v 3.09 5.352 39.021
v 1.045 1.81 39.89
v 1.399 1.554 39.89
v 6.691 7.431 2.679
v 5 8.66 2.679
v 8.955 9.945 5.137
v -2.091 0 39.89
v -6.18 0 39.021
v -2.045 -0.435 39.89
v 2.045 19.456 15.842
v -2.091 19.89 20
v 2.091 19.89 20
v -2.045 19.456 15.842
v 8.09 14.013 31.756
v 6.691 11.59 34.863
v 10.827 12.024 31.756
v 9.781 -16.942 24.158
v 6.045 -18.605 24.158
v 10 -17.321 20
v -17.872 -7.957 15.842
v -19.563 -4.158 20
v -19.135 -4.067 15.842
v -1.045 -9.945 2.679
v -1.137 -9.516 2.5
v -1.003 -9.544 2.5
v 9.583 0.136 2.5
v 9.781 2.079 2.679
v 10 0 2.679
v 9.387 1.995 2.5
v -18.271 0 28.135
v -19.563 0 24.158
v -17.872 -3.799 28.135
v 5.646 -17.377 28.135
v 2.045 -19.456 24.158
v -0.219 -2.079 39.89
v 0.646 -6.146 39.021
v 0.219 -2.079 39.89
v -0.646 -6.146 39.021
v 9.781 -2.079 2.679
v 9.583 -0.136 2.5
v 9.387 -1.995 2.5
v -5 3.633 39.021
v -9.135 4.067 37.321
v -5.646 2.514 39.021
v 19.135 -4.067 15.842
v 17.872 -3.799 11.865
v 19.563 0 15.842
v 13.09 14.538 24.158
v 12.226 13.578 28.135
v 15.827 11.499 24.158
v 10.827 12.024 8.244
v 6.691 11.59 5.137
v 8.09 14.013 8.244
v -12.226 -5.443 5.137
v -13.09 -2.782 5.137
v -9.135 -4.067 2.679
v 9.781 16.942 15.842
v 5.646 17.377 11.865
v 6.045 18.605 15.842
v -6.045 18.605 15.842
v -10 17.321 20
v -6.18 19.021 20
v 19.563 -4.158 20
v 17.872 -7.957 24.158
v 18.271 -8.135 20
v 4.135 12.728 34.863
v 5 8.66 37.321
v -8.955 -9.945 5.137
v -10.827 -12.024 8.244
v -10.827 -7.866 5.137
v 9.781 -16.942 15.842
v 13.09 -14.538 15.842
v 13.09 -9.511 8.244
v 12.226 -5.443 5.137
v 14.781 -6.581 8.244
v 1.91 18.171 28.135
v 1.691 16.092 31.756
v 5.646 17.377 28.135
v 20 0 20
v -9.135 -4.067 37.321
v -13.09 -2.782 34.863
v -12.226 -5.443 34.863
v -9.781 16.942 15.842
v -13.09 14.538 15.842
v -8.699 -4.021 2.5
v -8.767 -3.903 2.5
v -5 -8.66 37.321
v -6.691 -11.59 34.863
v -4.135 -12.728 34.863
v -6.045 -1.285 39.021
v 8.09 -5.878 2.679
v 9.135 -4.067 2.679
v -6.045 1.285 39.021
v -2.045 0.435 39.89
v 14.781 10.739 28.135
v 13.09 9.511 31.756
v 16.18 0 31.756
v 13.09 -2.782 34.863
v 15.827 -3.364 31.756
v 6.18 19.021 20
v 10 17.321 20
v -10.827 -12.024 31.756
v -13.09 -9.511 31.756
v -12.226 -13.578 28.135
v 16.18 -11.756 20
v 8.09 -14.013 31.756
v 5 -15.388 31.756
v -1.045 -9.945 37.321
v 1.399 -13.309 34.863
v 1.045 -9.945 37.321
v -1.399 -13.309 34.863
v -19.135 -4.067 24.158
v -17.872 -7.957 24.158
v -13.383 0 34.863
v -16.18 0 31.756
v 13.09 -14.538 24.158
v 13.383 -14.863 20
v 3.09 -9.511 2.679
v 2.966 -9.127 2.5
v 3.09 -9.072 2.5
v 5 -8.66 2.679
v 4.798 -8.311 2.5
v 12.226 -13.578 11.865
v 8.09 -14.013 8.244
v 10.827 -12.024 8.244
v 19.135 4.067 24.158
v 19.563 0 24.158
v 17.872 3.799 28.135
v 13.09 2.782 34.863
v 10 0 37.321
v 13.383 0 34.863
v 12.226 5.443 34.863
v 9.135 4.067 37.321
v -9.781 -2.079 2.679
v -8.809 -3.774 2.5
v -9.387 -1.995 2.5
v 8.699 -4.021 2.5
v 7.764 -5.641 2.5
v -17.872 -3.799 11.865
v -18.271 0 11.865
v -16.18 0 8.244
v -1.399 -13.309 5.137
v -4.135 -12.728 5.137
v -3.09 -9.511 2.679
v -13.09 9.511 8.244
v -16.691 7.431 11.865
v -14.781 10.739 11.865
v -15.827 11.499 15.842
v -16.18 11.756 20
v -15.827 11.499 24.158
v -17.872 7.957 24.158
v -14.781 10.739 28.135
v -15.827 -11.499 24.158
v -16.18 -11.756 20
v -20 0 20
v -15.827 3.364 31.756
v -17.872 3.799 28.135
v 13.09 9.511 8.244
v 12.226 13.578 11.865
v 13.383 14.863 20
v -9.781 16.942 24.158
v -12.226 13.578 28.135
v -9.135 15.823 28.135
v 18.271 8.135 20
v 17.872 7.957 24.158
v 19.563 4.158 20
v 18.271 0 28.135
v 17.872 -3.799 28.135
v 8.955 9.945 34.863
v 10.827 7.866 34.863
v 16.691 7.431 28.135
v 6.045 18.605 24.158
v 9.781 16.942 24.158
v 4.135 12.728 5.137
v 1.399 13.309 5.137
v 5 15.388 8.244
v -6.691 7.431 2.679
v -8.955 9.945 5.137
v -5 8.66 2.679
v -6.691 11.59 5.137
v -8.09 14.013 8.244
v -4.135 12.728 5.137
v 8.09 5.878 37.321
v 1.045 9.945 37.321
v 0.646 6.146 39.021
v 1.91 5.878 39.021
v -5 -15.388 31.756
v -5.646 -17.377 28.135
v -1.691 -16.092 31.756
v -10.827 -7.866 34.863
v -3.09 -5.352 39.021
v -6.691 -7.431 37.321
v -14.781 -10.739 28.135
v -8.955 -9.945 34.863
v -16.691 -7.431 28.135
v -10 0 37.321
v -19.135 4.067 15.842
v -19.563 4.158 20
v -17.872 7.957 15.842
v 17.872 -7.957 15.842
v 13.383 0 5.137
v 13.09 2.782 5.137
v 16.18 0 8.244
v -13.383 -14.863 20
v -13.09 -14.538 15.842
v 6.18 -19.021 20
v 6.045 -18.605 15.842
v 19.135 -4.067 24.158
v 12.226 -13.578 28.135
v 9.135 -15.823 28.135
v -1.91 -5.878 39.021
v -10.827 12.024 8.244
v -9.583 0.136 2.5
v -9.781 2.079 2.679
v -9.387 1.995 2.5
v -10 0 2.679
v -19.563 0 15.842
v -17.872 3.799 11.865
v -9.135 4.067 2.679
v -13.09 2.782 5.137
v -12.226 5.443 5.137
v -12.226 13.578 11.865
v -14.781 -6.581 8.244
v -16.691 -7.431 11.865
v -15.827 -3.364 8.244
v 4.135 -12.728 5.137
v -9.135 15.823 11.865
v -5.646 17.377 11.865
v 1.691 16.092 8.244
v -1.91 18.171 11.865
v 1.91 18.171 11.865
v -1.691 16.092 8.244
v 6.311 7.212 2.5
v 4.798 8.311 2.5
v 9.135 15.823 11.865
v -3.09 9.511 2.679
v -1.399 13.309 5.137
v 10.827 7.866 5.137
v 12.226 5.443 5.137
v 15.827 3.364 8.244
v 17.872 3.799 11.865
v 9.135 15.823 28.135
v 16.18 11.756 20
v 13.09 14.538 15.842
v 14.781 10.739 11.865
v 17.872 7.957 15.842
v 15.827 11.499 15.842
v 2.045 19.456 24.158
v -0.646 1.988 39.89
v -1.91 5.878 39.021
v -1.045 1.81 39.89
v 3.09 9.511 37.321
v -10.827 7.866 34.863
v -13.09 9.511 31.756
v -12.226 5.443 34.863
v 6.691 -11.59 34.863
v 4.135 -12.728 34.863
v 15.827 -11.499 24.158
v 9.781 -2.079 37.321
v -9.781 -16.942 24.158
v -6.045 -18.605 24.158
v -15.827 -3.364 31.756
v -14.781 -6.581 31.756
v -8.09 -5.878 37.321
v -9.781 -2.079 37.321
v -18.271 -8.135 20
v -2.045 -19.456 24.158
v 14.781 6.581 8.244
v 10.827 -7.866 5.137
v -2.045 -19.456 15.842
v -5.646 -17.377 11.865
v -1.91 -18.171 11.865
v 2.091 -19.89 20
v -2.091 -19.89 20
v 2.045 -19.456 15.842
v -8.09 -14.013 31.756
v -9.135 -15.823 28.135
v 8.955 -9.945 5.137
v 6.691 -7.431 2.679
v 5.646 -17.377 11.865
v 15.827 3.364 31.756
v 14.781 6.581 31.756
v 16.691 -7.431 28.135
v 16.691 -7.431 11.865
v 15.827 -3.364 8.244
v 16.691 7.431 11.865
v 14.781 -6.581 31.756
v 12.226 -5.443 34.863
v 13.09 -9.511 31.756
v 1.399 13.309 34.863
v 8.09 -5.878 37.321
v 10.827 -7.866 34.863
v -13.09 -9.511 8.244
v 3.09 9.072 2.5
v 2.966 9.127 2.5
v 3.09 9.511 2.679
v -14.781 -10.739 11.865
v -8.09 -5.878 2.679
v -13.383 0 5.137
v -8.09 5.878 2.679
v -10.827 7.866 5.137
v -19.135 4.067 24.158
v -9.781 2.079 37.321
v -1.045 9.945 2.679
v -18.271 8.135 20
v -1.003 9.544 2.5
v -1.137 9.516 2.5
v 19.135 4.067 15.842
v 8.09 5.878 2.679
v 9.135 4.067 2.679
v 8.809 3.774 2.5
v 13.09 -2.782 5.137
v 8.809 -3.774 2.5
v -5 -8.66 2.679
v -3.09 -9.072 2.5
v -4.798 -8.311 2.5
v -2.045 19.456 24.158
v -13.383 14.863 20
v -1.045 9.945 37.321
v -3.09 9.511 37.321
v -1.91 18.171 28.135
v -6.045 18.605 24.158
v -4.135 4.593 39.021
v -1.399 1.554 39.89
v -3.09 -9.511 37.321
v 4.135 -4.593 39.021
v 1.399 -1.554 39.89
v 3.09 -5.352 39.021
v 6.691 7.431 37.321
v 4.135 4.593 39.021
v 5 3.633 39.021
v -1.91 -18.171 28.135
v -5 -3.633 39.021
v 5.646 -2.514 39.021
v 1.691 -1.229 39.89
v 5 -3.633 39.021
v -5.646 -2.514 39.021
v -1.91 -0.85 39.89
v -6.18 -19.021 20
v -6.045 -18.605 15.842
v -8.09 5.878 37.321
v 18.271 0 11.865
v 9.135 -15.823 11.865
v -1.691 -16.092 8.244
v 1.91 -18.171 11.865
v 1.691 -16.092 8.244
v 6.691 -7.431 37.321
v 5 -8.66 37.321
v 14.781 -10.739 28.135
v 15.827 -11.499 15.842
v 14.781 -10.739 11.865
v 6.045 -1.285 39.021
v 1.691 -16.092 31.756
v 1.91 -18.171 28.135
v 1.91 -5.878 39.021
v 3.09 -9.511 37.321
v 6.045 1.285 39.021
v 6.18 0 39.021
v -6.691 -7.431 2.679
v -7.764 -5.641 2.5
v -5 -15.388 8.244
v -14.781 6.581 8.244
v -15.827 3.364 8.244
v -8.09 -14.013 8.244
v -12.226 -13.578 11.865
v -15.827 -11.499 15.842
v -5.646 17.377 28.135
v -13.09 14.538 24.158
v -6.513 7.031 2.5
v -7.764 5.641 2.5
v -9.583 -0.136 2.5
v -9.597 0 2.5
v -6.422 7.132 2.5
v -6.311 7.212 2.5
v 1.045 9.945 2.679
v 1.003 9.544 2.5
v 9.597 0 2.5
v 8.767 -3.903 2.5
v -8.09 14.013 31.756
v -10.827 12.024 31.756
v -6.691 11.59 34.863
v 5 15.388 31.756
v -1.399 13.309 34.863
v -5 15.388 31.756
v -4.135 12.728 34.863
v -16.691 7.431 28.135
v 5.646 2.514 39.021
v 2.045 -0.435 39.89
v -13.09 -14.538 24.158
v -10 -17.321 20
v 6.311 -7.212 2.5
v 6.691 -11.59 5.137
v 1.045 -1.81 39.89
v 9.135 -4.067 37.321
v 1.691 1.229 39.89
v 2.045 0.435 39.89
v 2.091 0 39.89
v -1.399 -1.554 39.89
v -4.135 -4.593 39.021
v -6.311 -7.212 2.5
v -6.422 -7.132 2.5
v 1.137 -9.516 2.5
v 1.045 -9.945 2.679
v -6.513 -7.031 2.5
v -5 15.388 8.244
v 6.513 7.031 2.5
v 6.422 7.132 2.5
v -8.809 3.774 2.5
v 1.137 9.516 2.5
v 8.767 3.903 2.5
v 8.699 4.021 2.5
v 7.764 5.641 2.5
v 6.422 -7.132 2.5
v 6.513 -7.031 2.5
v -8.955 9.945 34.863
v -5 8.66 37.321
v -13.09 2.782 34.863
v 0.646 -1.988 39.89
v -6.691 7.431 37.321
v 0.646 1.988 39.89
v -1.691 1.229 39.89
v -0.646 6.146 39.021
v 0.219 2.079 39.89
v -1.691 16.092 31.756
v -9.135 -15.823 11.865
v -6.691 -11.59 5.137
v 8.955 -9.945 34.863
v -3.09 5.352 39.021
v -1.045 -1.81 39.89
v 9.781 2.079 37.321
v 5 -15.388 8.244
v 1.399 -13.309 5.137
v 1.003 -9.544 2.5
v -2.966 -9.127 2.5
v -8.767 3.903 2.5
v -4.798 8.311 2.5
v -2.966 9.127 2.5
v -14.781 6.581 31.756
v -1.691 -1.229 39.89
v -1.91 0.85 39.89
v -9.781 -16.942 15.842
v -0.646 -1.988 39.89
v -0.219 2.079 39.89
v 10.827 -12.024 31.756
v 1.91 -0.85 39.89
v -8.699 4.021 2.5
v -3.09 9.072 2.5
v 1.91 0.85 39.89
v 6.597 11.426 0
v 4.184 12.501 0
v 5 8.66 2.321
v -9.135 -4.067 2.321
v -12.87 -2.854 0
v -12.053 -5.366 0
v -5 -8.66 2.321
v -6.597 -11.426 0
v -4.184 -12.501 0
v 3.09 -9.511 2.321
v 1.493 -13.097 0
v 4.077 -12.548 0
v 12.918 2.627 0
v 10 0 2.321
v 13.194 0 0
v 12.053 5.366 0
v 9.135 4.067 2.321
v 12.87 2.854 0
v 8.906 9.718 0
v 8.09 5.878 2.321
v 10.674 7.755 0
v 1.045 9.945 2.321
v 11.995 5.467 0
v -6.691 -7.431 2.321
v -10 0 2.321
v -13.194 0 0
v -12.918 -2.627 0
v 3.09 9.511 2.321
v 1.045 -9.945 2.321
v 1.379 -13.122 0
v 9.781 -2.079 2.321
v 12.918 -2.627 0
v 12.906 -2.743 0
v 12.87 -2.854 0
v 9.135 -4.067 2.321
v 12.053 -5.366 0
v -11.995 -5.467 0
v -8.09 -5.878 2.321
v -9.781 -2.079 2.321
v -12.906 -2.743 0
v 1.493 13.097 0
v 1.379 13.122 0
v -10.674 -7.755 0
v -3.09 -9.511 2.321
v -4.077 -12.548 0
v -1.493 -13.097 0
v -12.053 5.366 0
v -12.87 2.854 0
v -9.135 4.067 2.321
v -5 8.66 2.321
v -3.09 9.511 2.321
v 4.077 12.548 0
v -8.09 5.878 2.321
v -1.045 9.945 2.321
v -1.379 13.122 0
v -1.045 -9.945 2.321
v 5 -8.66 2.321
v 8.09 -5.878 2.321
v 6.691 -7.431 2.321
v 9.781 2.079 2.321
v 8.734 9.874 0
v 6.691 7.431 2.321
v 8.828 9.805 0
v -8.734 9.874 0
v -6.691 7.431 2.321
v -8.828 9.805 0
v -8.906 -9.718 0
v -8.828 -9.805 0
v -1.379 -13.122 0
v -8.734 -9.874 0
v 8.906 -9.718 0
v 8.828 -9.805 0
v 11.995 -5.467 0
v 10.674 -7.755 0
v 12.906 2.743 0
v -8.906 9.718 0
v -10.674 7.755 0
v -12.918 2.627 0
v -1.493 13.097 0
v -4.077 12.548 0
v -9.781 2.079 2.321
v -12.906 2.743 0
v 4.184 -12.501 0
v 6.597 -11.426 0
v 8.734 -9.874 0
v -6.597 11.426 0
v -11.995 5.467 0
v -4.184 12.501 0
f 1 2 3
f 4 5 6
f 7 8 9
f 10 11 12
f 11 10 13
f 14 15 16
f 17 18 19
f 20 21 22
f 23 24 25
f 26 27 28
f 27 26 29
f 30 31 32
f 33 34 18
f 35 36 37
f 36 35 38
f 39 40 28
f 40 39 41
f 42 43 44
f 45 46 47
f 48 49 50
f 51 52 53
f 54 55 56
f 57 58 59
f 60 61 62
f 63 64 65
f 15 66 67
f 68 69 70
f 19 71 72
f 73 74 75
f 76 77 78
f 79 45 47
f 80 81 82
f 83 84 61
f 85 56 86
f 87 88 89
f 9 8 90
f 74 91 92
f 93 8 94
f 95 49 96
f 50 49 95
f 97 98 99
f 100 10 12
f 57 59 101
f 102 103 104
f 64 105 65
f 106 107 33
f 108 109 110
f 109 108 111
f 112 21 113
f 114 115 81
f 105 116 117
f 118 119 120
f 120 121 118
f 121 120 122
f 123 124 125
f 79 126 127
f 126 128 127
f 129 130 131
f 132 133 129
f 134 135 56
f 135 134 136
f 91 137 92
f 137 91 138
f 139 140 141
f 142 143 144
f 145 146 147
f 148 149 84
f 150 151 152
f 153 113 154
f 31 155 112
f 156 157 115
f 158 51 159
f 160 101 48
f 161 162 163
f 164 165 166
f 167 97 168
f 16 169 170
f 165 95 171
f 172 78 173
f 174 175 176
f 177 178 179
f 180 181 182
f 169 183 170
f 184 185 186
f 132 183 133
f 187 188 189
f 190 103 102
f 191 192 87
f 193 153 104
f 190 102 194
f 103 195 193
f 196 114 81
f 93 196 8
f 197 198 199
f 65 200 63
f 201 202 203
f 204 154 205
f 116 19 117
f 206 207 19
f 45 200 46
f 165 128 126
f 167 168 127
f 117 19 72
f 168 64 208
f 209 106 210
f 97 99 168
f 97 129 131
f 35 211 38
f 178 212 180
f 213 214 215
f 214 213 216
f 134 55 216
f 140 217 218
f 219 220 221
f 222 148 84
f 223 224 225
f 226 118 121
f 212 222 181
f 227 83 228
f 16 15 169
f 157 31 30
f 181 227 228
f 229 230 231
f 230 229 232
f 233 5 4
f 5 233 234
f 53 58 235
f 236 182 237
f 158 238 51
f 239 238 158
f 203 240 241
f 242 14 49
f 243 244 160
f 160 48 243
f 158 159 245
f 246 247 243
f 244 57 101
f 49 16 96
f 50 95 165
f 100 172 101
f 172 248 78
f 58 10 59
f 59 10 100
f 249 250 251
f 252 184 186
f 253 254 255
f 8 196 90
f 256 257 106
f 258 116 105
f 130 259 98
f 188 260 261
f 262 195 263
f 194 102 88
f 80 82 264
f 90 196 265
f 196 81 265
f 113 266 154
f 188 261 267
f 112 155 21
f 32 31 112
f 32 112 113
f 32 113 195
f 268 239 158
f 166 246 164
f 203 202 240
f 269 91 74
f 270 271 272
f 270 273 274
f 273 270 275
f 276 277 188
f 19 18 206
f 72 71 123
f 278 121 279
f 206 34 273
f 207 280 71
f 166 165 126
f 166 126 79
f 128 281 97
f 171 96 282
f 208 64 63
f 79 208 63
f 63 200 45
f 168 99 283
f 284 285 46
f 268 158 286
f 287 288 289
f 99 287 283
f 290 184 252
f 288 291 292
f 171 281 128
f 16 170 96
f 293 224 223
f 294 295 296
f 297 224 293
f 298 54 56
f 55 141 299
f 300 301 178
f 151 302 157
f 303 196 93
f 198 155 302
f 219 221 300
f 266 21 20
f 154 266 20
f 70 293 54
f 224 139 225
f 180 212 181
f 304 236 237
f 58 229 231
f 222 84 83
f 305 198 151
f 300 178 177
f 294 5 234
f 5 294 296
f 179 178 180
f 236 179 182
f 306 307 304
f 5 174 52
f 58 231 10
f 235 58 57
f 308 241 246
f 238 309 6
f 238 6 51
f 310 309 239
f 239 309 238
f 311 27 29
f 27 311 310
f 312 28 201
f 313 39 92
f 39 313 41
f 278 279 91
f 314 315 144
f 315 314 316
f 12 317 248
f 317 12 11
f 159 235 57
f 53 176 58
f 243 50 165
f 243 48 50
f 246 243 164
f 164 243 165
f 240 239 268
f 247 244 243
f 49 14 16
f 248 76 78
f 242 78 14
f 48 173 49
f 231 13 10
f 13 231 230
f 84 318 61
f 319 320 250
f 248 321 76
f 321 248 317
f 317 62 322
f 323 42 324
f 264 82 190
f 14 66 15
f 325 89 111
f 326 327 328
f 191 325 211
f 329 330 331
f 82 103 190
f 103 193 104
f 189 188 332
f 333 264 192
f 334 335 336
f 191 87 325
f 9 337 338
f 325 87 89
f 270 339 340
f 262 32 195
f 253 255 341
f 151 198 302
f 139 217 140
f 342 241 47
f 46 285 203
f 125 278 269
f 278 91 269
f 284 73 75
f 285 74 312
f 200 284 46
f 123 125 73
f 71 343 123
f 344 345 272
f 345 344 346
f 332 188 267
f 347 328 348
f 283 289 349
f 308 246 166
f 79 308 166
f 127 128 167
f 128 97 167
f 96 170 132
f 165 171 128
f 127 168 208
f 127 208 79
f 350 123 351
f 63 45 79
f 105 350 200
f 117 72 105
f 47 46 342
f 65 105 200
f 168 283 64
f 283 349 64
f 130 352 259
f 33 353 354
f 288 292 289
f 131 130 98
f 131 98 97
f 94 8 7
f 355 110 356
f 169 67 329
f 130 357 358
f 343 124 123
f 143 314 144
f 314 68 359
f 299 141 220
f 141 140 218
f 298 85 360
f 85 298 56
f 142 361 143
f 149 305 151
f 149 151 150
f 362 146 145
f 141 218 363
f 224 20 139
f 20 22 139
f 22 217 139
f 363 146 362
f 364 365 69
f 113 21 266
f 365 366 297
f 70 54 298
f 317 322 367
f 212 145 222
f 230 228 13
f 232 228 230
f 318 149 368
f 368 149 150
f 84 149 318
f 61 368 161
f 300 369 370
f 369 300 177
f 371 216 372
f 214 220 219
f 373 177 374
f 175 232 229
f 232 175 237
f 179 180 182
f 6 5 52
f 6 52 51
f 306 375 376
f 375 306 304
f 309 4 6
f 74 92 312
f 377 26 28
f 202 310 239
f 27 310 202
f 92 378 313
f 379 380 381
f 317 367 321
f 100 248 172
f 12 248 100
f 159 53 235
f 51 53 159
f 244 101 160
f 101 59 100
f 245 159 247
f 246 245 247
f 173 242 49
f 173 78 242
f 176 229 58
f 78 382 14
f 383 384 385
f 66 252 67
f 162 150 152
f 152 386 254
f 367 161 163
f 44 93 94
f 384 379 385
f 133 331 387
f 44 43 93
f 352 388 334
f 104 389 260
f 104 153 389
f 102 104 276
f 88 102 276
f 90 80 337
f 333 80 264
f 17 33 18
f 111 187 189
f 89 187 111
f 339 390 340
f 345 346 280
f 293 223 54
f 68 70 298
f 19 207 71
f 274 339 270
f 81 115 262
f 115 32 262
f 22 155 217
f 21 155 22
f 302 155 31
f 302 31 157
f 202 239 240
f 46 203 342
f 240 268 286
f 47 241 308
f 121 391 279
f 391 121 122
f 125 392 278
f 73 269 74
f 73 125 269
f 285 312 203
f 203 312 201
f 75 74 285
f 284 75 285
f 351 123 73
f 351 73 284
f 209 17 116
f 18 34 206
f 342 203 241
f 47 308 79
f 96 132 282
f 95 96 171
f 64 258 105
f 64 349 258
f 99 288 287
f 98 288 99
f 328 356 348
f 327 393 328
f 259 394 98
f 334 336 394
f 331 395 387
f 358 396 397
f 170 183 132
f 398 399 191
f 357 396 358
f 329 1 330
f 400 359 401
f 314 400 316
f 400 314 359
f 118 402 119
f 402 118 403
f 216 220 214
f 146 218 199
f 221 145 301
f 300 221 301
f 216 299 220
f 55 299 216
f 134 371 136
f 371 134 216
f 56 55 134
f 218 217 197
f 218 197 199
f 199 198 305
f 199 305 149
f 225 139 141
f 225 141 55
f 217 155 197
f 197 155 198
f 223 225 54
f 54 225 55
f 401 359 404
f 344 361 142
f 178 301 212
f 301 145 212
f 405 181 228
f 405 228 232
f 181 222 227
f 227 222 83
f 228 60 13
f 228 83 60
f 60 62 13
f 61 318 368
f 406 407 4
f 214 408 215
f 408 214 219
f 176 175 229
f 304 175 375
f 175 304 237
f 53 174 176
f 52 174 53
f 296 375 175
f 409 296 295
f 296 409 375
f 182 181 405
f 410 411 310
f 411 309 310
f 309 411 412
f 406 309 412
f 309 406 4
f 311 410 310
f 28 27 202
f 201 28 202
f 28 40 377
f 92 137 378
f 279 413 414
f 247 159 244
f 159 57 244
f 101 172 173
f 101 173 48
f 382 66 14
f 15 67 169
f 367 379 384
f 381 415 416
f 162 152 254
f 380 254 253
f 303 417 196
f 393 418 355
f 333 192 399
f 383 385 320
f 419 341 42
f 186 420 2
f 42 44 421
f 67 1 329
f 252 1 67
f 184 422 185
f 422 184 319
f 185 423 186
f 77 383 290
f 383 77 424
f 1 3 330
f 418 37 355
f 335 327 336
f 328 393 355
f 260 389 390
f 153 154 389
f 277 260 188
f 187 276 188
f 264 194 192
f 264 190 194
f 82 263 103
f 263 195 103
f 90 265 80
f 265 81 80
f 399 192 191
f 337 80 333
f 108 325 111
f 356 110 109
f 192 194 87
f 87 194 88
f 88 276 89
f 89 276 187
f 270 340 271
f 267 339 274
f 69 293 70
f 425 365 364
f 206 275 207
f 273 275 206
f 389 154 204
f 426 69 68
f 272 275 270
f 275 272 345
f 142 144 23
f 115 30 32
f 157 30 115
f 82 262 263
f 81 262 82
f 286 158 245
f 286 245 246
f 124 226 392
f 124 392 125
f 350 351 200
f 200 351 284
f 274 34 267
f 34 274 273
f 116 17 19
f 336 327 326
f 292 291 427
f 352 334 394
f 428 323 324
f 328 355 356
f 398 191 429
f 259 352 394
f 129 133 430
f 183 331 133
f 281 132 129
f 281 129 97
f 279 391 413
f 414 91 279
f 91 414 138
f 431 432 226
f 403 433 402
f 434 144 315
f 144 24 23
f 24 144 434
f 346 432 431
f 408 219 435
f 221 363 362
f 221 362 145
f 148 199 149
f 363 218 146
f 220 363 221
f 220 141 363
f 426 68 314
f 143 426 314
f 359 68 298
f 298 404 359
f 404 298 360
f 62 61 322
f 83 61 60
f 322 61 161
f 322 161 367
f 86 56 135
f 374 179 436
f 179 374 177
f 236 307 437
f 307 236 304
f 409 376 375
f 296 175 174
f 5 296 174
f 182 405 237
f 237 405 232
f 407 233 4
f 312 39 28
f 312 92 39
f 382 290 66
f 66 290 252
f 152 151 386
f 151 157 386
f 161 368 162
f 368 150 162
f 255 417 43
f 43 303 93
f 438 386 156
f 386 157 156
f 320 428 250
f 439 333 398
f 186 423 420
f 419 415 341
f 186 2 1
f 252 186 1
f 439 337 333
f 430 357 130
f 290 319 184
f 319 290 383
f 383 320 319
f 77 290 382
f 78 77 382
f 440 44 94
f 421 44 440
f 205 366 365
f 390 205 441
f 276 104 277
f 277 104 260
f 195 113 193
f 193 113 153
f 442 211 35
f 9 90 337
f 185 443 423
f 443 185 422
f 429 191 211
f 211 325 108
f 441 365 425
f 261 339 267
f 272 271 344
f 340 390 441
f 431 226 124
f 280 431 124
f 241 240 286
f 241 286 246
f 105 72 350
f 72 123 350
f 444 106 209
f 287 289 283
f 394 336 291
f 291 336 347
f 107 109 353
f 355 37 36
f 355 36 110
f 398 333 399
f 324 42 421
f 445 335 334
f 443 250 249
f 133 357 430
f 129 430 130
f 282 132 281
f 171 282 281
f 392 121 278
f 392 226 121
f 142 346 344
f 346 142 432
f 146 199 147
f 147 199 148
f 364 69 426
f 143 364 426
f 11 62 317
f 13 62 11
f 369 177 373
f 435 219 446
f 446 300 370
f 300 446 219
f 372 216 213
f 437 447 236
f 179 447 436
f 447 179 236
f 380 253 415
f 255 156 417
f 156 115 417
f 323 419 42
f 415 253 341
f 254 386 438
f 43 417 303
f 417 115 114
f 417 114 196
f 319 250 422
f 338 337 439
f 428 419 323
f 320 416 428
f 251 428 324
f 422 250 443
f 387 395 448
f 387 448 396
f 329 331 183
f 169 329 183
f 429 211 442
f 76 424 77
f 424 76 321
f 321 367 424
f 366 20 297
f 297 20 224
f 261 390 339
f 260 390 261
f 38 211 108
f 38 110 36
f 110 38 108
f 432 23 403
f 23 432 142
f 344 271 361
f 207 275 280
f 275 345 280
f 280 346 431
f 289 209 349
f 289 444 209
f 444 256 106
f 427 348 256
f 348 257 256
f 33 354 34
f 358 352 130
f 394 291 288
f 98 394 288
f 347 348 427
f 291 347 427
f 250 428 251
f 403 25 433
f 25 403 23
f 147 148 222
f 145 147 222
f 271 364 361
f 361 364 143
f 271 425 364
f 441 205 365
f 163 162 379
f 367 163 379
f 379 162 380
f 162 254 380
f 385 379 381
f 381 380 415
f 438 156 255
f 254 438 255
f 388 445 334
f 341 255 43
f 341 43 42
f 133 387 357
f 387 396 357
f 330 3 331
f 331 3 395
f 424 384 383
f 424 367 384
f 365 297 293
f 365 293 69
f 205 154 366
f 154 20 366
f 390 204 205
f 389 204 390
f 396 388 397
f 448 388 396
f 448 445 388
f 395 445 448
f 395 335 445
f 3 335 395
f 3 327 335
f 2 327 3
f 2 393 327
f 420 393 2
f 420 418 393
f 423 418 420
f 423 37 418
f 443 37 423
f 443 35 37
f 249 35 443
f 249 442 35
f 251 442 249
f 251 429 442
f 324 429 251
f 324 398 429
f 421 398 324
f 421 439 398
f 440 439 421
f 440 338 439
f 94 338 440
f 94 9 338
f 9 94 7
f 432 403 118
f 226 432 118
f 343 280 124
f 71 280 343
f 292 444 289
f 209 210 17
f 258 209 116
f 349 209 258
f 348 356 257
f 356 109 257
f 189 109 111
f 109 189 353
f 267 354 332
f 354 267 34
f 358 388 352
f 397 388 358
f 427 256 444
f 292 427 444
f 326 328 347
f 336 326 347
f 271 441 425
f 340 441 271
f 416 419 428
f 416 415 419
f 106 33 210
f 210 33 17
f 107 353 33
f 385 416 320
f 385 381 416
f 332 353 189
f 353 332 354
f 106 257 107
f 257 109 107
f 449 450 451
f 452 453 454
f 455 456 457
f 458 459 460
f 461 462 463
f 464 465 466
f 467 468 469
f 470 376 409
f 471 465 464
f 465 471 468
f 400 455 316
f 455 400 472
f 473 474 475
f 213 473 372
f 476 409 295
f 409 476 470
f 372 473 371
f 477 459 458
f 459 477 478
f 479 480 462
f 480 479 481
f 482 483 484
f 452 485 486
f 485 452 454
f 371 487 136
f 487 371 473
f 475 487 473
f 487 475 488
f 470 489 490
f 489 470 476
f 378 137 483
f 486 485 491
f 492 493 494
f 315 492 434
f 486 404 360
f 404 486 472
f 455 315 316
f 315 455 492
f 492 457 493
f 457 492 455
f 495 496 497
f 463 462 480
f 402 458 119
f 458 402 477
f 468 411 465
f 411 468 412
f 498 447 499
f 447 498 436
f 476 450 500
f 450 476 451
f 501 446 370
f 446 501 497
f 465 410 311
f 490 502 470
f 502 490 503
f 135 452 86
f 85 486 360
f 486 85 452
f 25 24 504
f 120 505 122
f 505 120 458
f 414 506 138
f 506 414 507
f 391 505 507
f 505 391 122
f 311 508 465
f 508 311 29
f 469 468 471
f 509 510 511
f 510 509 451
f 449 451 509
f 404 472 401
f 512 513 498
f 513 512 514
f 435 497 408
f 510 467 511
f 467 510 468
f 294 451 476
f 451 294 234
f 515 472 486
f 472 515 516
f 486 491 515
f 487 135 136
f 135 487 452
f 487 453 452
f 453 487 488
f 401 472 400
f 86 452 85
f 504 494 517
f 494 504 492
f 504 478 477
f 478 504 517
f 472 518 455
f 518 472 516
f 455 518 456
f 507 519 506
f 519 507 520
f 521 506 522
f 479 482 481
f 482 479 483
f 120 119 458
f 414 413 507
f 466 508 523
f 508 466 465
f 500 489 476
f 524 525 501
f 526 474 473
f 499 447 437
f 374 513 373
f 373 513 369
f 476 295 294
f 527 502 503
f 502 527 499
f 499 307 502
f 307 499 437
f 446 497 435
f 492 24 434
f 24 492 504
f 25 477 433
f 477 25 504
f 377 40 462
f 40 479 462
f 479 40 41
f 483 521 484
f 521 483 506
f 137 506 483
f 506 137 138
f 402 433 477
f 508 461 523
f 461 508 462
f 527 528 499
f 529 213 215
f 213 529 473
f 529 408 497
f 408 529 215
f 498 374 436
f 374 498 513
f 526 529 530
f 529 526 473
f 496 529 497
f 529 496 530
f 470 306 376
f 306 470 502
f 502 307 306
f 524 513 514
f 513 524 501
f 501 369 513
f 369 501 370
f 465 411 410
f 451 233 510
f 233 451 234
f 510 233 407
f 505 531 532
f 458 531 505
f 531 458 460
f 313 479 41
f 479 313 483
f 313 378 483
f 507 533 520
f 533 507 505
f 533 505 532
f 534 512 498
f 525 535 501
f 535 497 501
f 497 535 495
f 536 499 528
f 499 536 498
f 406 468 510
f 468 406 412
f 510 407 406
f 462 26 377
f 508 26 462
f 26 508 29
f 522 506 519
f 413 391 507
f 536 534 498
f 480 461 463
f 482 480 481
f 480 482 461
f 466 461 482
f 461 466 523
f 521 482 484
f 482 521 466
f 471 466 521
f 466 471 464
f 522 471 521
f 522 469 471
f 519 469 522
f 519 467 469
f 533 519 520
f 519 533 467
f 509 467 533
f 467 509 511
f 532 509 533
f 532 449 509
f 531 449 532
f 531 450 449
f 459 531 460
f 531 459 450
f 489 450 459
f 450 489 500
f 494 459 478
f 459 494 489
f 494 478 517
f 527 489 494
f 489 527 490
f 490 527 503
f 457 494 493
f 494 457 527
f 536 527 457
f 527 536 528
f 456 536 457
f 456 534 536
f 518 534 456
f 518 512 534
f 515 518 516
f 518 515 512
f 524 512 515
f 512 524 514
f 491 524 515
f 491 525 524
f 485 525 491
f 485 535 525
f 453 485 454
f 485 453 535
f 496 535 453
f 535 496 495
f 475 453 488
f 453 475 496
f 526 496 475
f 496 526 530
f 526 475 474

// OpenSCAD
difference() {
  union() {
    translate([0, 0, 20]) sphere(20);
    translate([0, 0, -15]) sphere(20);
  }
  translate([0, 0, -20]) cube(40, center = true);  
}
